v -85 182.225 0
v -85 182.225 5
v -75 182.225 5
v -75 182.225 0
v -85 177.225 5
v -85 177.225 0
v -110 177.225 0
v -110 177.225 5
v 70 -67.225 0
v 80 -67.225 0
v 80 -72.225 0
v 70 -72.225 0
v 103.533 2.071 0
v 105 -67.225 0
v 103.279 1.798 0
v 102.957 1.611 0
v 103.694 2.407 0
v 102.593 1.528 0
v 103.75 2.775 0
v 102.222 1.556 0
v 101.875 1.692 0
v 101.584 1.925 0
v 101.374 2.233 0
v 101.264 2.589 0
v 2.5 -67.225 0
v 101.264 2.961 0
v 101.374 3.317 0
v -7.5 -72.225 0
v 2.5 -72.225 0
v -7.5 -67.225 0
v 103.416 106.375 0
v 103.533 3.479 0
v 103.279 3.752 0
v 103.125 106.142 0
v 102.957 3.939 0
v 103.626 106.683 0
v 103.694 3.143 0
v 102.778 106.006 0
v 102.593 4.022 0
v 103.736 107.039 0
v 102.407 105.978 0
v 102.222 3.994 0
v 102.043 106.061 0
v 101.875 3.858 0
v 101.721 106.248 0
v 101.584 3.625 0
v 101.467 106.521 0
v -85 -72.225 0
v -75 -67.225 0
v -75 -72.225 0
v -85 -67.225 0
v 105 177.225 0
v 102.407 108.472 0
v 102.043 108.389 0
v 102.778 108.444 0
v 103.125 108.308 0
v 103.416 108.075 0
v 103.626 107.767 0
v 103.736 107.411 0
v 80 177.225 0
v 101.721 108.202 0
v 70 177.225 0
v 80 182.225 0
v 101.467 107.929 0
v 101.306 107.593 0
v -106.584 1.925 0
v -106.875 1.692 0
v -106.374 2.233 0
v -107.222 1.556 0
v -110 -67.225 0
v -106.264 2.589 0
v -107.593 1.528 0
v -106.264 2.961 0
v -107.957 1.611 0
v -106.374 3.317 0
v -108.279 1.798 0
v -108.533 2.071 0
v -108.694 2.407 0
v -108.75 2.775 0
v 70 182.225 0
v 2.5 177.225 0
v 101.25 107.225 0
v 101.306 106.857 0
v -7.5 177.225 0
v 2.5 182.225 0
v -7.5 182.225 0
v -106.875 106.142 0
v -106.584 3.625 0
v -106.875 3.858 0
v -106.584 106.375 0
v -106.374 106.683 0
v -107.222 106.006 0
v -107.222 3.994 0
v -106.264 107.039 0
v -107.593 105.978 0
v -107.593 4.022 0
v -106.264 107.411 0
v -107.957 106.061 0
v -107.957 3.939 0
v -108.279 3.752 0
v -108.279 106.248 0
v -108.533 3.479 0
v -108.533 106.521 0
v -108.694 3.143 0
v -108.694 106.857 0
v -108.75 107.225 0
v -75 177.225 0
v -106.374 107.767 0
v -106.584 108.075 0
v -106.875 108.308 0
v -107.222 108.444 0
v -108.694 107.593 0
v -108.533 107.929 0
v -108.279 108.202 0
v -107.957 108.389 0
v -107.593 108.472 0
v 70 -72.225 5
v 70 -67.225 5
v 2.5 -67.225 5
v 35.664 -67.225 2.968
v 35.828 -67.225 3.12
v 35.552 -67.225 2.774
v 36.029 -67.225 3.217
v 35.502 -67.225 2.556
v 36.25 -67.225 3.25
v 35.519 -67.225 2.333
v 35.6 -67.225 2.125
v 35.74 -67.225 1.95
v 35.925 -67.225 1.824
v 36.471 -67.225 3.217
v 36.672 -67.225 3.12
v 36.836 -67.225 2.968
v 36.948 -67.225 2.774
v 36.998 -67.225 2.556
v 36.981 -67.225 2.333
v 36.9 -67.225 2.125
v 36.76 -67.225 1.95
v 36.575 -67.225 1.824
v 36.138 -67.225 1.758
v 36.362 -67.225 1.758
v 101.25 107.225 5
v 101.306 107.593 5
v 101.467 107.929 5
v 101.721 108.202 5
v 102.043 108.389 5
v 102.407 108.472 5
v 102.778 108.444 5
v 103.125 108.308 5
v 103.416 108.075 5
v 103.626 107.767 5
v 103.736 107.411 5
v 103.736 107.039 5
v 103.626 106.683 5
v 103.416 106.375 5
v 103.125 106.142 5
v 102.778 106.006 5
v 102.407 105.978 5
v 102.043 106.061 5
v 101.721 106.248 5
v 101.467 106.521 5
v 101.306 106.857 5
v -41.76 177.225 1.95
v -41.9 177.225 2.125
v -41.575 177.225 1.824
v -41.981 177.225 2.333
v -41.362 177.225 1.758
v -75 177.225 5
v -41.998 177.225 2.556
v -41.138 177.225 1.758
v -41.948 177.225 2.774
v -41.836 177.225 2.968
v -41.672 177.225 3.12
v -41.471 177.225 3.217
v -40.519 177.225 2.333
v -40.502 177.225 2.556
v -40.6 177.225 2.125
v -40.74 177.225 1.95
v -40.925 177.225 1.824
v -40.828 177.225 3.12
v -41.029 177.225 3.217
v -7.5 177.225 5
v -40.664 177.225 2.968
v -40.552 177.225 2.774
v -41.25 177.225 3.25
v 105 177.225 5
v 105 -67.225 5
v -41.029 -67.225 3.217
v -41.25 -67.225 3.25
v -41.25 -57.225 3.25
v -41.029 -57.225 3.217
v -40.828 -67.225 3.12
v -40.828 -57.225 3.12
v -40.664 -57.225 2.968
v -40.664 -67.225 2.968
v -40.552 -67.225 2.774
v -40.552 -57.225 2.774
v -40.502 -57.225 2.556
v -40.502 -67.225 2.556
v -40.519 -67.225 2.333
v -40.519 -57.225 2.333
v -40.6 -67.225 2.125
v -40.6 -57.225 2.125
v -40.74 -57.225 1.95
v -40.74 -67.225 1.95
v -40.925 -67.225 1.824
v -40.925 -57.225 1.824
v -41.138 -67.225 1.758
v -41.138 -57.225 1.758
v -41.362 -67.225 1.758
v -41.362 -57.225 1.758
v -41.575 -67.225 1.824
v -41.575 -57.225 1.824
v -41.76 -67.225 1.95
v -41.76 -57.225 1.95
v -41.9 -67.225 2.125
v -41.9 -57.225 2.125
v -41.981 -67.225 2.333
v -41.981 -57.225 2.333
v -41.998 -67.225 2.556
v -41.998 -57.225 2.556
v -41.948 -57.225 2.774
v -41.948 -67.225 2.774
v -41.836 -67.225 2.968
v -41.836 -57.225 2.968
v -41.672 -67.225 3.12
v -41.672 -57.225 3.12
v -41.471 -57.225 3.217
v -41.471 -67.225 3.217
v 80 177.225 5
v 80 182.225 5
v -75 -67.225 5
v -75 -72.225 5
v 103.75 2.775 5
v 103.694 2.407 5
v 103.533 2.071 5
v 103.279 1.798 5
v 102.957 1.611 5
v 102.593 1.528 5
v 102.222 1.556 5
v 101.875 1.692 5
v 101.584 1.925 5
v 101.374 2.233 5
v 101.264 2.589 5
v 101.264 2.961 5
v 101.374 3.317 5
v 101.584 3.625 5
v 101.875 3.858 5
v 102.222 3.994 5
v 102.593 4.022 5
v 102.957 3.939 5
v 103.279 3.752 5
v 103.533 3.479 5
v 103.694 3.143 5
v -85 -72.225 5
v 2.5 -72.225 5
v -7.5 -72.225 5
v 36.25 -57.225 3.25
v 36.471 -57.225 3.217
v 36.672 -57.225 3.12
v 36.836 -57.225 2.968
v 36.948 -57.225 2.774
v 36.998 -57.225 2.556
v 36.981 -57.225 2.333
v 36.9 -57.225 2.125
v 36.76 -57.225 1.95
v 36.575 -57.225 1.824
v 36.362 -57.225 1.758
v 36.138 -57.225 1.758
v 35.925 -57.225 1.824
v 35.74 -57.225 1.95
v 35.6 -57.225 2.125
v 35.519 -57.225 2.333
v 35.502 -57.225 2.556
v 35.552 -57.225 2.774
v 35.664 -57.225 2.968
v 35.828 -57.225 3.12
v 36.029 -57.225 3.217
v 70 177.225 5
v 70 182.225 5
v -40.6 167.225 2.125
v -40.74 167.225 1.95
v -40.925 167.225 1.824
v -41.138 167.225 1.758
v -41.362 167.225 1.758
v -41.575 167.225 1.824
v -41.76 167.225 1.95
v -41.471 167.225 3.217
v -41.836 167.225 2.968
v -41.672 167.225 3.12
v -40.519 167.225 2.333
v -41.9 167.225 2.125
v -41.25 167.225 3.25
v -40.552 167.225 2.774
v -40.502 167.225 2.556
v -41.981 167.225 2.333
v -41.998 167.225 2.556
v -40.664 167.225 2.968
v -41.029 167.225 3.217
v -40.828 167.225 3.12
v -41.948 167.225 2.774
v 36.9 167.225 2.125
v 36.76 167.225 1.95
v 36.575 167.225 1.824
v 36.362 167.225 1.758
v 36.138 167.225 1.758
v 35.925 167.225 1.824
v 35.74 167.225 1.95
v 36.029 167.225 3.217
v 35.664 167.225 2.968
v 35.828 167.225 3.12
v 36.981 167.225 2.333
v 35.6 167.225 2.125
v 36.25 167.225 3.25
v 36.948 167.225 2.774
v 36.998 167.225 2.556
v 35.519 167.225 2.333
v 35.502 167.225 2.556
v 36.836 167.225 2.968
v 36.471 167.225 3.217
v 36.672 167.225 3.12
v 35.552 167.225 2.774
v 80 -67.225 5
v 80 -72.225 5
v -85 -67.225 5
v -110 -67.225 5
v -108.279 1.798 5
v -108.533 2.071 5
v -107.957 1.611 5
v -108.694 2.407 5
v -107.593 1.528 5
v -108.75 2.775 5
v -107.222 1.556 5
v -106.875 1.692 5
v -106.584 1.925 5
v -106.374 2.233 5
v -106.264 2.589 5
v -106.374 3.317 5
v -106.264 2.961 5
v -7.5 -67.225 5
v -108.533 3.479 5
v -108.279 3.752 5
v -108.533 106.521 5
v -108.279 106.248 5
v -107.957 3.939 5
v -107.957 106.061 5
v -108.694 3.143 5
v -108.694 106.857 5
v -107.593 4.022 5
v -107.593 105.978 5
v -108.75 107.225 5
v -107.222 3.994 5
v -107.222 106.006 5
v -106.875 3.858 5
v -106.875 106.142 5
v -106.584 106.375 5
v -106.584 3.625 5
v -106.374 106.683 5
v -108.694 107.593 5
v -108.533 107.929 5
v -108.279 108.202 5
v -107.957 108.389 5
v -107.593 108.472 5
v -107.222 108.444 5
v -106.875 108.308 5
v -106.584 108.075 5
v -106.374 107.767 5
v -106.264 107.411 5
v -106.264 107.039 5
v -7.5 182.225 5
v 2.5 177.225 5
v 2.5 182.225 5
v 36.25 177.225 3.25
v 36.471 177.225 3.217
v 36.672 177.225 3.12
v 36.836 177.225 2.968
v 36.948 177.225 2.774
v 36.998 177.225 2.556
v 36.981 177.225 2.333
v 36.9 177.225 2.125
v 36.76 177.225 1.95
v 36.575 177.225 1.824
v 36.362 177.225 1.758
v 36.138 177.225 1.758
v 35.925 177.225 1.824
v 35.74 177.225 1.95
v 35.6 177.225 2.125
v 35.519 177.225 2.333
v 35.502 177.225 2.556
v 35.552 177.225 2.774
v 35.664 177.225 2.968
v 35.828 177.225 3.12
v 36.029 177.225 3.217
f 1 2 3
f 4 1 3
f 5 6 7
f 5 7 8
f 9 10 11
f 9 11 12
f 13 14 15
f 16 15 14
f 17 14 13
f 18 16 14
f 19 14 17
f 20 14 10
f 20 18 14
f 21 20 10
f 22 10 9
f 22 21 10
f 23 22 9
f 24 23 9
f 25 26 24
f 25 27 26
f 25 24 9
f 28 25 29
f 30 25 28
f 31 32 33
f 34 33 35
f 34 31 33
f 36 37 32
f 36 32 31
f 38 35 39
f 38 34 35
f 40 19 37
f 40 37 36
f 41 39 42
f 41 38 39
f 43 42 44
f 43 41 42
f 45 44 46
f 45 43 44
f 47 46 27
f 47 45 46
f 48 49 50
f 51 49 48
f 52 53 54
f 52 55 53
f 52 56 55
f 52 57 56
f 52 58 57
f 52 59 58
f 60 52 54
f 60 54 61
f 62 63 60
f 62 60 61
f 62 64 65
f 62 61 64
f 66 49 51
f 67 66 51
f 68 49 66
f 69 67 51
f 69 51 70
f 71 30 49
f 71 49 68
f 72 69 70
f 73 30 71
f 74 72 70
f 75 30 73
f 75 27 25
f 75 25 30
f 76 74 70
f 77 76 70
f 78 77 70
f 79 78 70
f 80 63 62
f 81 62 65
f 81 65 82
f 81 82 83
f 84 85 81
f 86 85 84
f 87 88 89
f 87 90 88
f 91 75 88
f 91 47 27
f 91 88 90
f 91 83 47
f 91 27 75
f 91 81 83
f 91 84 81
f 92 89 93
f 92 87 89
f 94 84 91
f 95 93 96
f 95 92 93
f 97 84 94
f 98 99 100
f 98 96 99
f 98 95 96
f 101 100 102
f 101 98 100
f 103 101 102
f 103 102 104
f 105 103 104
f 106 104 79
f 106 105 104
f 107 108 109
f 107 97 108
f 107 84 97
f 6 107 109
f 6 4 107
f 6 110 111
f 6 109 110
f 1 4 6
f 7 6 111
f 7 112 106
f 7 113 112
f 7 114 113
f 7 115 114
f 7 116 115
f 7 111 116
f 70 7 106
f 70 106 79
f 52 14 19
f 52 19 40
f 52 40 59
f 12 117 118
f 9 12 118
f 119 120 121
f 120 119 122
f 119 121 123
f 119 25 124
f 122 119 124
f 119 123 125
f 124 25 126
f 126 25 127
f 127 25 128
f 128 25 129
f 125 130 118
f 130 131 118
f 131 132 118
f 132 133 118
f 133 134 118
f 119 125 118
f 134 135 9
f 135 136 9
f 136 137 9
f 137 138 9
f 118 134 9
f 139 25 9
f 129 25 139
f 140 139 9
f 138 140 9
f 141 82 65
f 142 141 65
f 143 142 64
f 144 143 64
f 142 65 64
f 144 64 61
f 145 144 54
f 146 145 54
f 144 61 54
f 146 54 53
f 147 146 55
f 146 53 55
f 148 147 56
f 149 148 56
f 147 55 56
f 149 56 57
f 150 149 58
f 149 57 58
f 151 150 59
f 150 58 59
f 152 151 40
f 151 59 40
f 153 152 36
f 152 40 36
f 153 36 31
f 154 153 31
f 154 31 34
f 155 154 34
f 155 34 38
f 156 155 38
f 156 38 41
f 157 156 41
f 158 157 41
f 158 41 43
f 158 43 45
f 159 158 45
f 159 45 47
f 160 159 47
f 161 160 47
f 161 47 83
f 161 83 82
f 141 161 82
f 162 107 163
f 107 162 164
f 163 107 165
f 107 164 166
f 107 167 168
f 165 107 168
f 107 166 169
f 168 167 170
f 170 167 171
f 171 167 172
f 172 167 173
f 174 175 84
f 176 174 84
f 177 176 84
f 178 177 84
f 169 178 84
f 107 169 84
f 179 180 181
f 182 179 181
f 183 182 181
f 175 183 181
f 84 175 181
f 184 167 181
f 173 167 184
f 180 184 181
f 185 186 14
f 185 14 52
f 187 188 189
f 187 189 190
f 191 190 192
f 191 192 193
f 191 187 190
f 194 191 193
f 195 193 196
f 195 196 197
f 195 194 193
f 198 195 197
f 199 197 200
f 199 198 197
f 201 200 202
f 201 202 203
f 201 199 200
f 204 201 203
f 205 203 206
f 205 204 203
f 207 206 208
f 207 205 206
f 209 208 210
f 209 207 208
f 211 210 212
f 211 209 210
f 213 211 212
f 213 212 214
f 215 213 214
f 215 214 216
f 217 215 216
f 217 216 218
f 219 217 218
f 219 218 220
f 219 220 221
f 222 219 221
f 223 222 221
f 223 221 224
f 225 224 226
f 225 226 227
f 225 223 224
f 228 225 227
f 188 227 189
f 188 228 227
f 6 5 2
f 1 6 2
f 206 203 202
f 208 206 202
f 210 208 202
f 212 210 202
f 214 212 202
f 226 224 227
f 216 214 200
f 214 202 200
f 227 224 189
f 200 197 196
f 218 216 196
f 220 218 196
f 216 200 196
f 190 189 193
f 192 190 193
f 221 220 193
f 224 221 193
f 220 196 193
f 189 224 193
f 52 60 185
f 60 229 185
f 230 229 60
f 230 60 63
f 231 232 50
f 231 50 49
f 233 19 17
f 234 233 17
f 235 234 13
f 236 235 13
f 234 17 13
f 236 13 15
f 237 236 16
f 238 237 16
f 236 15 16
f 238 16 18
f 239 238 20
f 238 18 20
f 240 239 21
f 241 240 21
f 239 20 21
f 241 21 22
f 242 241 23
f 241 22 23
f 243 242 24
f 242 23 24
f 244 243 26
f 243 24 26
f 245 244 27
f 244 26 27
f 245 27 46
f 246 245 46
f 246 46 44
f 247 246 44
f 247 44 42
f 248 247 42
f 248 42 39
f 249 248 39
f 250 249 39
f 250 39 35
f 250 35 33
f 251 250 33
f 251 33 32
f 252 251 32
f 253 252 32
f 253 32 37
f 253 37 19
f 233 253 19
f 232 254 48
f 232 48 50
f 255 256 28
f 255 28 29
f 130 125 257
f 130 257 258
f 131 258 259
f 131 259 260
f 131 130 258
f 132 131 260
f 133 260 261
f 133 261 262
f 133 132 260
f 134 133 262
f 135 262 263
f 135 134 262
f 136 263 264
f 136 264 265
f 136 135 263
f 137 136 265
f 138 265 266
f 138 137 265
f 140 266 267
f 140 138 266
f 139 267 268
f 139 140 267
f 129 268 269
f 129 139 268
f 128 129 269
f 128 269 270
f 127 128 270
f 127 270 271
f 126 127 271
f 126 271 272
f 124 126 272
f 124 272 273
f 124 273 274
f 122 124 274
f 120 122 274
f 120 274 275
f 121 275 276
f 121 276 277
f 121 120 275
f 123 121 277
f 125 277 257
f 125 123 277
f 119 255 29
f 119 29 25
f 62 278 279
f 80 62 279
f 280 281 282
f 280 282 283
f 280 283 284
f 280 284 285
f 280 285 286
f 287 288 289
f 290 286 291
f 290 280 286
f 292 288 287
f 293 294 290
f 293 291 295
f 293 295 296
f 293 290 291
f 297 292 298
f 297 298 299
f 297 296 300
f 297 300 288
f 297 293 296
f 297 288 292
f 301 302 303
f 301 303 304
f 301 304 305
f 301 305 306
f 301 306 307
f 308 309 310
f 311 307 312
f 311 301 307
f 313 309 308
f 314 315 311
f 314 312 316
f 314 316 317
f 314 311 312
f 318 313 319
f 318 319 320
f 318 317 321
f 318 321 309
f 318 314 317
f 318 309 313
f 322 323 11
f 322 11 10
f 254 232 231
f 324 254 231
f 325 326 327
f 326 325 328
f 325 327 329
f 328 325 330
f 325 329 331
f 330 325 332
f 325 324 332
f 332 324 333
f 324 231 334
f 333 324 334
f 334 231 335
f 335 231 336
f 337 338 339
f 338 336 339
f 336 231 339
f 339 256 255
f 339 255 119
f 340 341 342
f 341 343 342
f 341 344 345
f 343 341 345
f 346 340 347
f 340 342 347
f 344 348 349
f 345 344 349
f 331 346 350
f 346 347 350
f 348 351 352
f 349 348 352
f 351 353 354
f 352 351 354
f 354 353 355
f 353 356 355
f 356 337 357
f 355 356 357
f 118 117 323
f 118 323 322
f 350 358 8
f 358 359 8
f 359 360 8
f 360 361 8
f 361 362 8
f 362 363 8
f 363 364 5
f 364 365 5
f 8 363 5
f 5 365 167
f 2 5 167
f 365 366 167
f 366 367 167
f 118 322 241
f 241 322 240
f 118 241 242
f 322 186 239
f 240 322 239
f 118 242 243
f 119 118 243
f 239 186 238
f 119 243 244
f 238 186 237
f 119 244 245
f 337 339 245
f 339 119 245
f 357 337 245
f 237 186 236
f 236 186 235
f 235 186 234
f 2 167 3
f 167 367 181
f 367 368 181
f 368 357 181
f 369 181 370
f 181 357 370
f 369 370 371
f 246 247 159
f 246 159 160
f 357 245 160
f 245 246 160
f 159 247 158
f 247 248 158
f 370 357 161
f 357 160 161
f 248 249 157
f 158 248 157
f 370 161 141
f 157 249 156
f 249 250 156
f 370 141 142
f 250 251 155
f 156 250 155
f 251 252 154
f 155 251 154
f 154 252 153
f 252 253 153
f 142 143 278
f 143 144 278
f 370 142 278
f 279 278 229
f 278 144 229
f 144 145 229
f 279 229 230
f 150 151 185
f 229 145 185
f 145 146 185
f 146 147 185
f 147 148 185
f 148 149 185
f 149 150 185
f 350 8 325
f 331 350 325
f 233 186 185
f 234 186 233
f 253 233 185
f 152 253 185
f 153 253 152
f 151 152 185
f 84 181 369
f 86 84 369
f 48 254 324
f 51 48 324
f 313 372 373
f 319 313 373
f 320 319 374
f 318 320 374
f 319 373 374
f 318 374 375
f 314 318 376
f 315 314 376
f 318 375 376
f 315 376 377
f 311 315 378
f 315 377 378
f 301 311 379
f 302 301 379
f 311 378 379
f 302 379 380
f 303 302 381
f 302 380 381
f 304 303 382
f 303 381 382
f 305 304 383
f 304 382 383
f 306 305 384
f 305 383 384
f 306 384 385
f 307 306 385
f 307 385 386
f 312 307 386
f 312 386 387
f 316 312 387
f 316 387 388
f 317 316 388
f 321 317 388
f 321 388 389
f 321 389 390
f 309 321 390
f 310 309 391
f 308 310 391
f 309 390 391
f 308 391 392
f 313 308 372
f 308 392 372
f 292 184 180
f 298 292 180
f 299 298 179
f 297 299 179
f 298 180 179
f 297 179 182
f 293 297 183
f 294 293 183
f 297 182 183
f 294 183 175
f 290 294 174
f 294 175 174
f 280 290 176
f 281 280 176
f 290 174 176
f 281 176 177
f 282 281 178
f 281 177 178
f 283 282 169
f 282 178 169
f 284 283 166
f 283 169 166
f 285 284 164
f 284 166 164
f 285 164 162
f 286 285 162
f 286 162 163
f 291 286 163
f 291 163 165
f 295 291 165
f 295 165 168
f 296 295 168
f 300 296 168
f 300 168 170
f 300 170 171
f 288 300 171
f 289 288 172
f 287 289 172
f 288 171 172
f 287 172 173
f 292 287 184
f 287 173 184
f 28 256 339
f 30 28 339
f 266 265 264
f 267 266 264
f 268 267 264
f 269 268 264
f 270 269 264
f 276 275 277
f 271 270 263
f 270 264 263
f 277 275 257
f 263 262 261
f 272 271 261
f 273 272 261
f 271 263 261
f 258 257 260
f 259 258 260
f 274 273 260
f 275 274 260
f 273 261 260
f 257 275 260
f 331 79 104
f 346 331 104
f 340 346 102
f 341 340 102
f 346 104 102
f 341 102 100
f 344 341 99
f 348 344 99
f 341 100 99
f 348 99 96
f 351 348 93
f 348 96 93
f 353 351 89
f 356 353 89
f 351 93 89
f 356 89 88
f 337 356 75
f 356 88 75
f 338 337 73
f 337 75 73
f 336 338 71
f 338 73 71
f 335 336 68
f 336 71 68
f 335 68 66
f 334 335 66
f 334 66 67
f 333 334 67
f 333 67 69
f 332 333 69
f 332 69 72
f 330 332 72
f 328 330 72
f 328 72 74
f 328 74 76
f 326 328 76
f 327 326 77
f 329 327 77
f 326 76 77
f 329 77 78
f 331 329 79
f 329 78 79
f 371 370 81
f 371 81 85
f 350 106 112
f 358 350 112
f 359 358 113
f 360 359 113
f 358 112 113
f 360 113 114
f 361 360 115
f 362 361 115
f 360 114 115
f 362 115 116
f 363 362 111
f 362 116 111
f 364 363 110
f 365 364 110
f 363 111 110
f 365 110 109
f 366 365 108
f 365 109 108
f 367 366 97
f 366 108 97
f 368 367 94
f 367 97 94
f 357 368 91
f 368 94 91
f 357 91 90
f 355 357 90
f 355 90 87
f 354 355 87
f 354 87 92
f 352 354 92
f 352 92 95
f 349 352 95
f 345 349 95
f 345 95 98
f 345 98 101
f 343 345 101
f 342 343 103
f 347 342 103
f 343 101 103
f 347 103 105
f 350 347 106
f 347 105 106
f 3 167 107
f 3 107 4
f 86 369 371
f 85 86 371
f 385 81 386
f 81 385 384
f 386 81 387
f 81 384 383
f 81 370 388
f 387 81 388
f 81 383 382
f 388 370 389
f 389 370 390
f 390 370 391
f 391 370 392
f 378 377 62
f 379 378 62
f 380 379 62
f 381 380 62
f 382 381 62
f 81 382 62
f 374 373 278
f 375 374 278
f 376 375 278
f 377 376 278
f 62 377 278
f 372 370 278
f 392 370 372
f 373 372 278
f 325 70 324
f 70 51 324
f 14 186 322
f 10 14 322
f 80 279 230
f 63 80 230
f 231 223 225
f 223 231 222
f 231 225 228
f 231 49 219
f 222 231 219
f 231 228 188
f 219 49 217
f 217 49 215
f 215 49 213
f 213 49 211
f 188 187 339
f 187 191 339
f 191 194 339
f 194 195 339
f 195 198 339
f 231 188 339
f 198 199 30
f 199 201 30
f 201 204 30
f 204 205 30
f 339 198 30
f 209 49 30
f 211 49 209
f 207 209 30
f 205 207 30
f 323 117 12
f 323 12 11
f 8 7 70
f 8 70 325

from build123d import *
from build123d.topology import SkipClean

# Parameters (mm, degrees)
SKIZZE1_W                       = 5
SKIZZE1_H                       = 5
SKIZZE1_W_2                     = 15
AUFSATZ_LINEAR_AUSTRAGEN1_DEPTH = 5
SKIZZE2_R                       = 2.75
SCHNITT_LINEAR_AUSTRAGEN1_DEPTH = 128.539996178
SCHNITT_LINEAR_AUSTRAGEN2_DEPTH = 128.539996178
SKIZZE4_R                       = 7.5
SCHNITT_LINEAR_AUSTRAGEN3_DEPTH = 128.539996178
SKIZZE5_R                       = 0.75
SKIZZE5_R_2                     = 6
SENSORS_DEPTH                   = 128.539996178
AUFSATZ_LINEAR_AUSTRAGEN2_DEPTH = 5
SKIZZE7_R                       = 1.25
SCHNITT_LINEAR_AUSTRAGEN5_DEPTH = 239.81729549
SKETCH1_W                       = 69.5
SKETCH1_H                       = 110
BOSS_EXTRUDE1_DEPTH             = 5
SKIZZE9_R                       = 0.75
SKIZZE9_R_2                     = 6
DISCRETECHANNEL_DEPTH           = 239.81729549
SKIZZE10_R                      = 0.75
SKIZZE10_R_2                    = 6
CONTCHANNEL_DEPTH               = 239.81729549
BOSS_EXTRUDE2_DEPTH             = 5
SKIZZE8_R                       = 0.75
SKIZZE8_R_2                     = 7.5
STEPDOWNCONVERTER_DEPTH         = 239.81729549
SKETCH3_R                       = 0.75
SKETCH3_R_2                     = 5
BBB_DEPTH                       = 5
BOSS_EXTRUDE3_DEPTH             = 5
SKETCH5_W                       = 55
SKETCH5_H                       = 244.45
CUT_EXTRUDE2_DEPTH              = 5
SKETCH6_R                       = 5
CUT_EXTRUDE3_DEPTH              = 5
SKETCH7_W                       = 5
SKETCH7_H                       = 10
BOSS_EXTRUDE4_DEPTH             = 5
SKETCH8_W                       = 10
SKETCH8_H                       = 5
BOSS_EXTRUDE5_DEPTH             = 5
BOSS_EXTRUDE6_START             = -5
SKETCH9_W                       = 210
SKETCH9_H                       = 244.45
SKETCH9_R                       = 2.75
SKETCH9_R_2                     = 7.5
BOSS_EXTRUDE6_DEPTH             = 5
SKETCH10_R                      = 1.25
CUT_EXTRUDE4_DEPTH              = 5
SKETCH11_R                      = 1.25
CUT_EXTRUDE5_DEPTH              = 211.370983325
SKETCH12_R                      = 0.75
CUT_EXTRUDE6_DEPTH              = 10
SKETCH13_W                      = 66.883325803
SKETCH13_H                      = 19.006877893
SKETCH13_W_2                    = 28.314677108
SKETCH13_H_2                    = 100.605818773
SKETCH13_W_3                    = 44.298538928
SKETCH13_H_3                    = 29.20603568
BOSS_EXTRUDE7_DEPTH             = 5
SKETCH14_W                      = 5
SKETCH14_H                      = 244.45
BOSS_EXTRUDE8_DEPTH             = 5
SKETCH15_R                      = 1.25
CUT_EXTRUDE7_DEPTH              = 5
SKETCH16_R                      = 1.25
BOSS_EXTRUDE9_DEPTH             = 5


with BuildPart() as part:
    # Skizze1 → Aufsatz-Linear austragen1 (new body)
    with BuildSketch(Plane.XY):
        Polygon((55, 67.225), (75, 67.225), (75, 72.225), (85, 72.225), (85, 67.225), (100, 67.225), (100, 47.225), (105, 47.225), (105, 37.225), (100, 37.225), (100, -37.225), (105, -37.225), (105, -47.225), (100, -47.225), (100, -67.225), (-100, -67.225), (-100, -47.225), (-105, -47.225), (-105, -37.225), (-100, -37.225), (-100, 37.225), (-105, 37.225), (-105, 47.225), (-100, 47.225), (-100, 67.225), (-85, 67.225), (-85, 72.225), (-75, 72.225), (-75, 67.225), (45, 67.225), (45, 72.225), (55, 72.225), align=None)
        with Locations((13, -40.055)):
            Rectangle(SKIZZE1_W, SKIZZE1_H, mode=Mode.SUBTRACT)
        with Locations((53, -40.055)):
            Rectangle(SKIZZE1_W, SKIZZE1_H, mode=Mode.SUBTRACT)
        with Locations((33, -40.055)):
            Rectangle(SKIZZE1_W_2, SKIZZE1_H, mode=Mode.SUBTRACT)
    extrude(amount=AUFSATZ_LINEAR_AUSTRAGEN1_DEPTH)

    # Skizze2 → Schnitt-Linear austragen1 (cut, through all)
    with BuildSketch(Plane.XY.offset(5)):
        with Locations((-59.5, 4.075)):
            Circle(SKIZZE2_R)
        with Locations((-24.5, -11.925)):
            Circle(SKIZZE2_R)
    extrude(amount=-SCHNITT_LINEAR_AUSTRAGEN1_DEPTH, mode=Mode.SUBTRACT)

    # Skizze3 → Schnitt-Linear austragen2 (cut, through all)
    with BuildSketch(Plane.XY.offset(5)):
        with BuildLine():
            Line((25, -17.555), (41, -17.555))
            ThreePointArc((41, -17.555), (42.414213562, -18.140786438), (43, -19.555))
            Line((43, -19.555), (43, -35.555))
            ThreePointArc((43, -35.555), (42.414213562, -36.969213562), (41, -37.555))
            Line((41, -37.555), (37, -37.555))
            Line((37, -37.555), (29, -37.555))
            Line((29, -37.555), (25, -37.555))
            ThreePointArc((25, -37.555), (23.585786438, -36.969213562), (23, -35.555))
            Line((23, -35.555), (23, -19.555))
            ThreePointArc((23, -19.555), (23.585786438, -18.140786438), (25, -17.555))
        make_face()
        with BuildLine():
            Line((-66.5, 54.225), (-66.5, 35.225))
            ThreePointArc((-66.5, 35.225), (-67.378679656, 33.103679656), (-69.5, 32.225))
            Line((-69.5, 32.225), (-88.5, 32.225))
            ThreePointArc((-88.5, 32.225), (-90.621320344, 33.103679656), (-91.5, 35.225))
            Line((-91.5, 35.225), (-91.5, 54.225))
            ThreePointArc((-91.5, 54.225), (-90.621320344, 56.346320344), (-88.5, 57.225))
            Line((-88.5, 57.225), (-69.5, 57.225))
            ThreePointArc((-69.5, 57.225), (-67.378679656, 56.346320344), (-66.5, 54.225))
        make_face()
        with BuildLine():
            Line((4.5, 57.225), (-14.5, 57.225))
            ThreePointArc((-14.5, 57.225), (-16.621320344, 56.346320344), (-17.5, 54.225))
            Line((-17.5, 54.225), (-17.5, 35.225))
            ThreePointArc((-17.5, 35.225), (-16.621320344, 33.103679656), (-14.5, 32.225))
            Line((-14.5, 32.225), (4.5, 32.225))
            ThreePointArc((4.5, 32.225), (6.621320344, 33.103679656), (7.5, 35.225))
            Line((7.5, 35.225), (7.5, 54.225))
            ThreePointArc((7.5, 54.225), (6.621320344, 56.346320344), (4.5, 57.225))
        make_face()
    extrude(amount=-SCHNITT_LINEAR_AUSTRAGEN2_DEPTH, mode=Mode.SUBTRACT)

    # Skizze4 → Schnitt-Linear austragen3 (cut, through all)
    with BuildSketch(Plane.XY.offset(5)):
        with Locations((-80.5, -30.925)):
            Circle(SKIZZE4_R)
        with Locations((-80.5, -11.925)):
            Circle(SKIZZE4_R)
        with Locations(Location((-80.5, -49.925, 0), (0, 0, 180))):
            Circle(SKIZZE4_R)
    extrude(amount=-SCHNITT_LINEAR_AUSTRAGEN3_DEPTH, mode=Mode.SUBTRACT)

    # Skizze5 → Sensors (cut, through all)
    with BuildSketch(Plane.XY.offset(5)):
        with Locations((-8, -45.225)):
            Circle(SKIZZE5_R)
        with Locations((-8, -3.225)):
            Circle(SKIZZE5_R)
        with Locations((83, -12.225)):
            Circle(SKIZZE5_R)
        with Locations((-15, -56.225)):
            Circle(SKIZZE5_R_2)
        with Locations((0, -56.225)):
            Circle(SKIZZE5_R_2)
        with Locations((15, -56.225)):
            Circle(SKIZZE5_R_2)
        with Locations((30, -56.225)):
            Circle(SKIZZE5_R_2)
        with Locations((45, -56.225)):
            Circle(SKIZZE5_R_2)
        with Locations((60, -56.225)):
            Circle(SKIZZE5_R_2)
        with Locations((75, -56.225)):
            Circle(SKIZZE5_R_2)
        with Locations((90, -56.225)):
            Circle(SKIZZE5_R_2)
    extrude(amount=-SENSORS_DEPTH, mode=Mode.SUBTRACT)

    # Skizze6 → Aufsatz-Linear austragen2 (add)
    with BuildSketch(Plane(origin=(0, 0, 0), x_dir=(-1, 0, 0), z_dir=(0, 0, -1))):
        Polygon((160, 47.225), (160, 37.225), (160, -37.225), (160, -47.225), (160, -67.225), (100, -67.225), (100, 67.225), (-30.5, 67.225), (-30.5, 177.225), (160, 177.225), (160, 67.225), align=None)
    extrude(amount=-AUFSATZ_LINEAR_AUSTRAGEN2_DEPTH)

    # Skizze7 → Schnitt-Linear austragen5 (cut, through all)
    with BuildSketch(Plane(origin=(0, 0, 0), x_dir=(-1, 0, 0), z_dir=(0, 0, -1))):
        with Locations((71.5, 32.775)):
            Circle(SKIZZE7_R)
        with Locations((96.5, 32.775)):
            Circle(SKIZZE7_R)
        with Locations((46.5, 32.775)):
            Circle(SKIZZE7_R)
    extrude(amount=-SCHNITT_LINEAR_AUSTRAGEN5_DEPTH, mode=Mode.SUBTRACT)

    # Sketch1 → Boss-Extrude1 (add)
    with BuildSketch(Plane.XY.offset(5)):
        with Locations((65.25, 122.225)):
            Rectangle(SKETCH1_W, SKETCH1_H)
    extrude(amount=-BOSS_EXTRUDE1_DEPTH)

    # Skizze9 → DiscreteChannel (cut, through all)
    with BuildSketch(Plane.XY.offset(5)):
        with Locations((8, 71.515)):
            Circle(SKIZZE9_R)
        with Locations(Location((69, 71.515, 0), (0, 0, 180))):
            Circle(SKIZZE9_R)
        with Locations(Location((8, 10.515, 0), (0, 0, 180))):
            Circle(SKIZZE9_R)
        with Locations((69, 10.515)):
            Circle(SKIZZE9_R)
        with Locations((-2, 5.015)):
            Circle(SKIZZE9_R_2)
        with Locations((-2, 29.015)):
            Circle(SKIZZE9_R_2)
        with Locations((-2, 53.015)):
            Circle(SKIZZE9_R_2)
        with Locations((-2, 77.015)):
            Circle(SKIZZE9_R_2)
    extrude(amount=-DISCRETECHANNEL_DEPTH, mode=Mode.SUBTRACT)

    # Skizze10 → ContChannel (cut, through all)
    with BuildSketch(Plane.XY.offset(5)):
        with Locations((-4, 136.225)):
            Circle(SKIZZE10_R)
        with Locations(Location((-4, 94.225, 0), (0, 0, 180))):
            Circle(SKIZZE10_R)
        with Locations(Location((-96, 136.225, 0), (0, 0, 180))):
            Circle(SKIZZE10_R)
        with Locations((-96, 94.225)):
            Circle(SKIZZE10_R)
        with Locations((-72.499999267, 166.225)):
            Circle(SKIZZE10_R_2)
        with Locations((-57.499999267, 166.225)):
            Circle(SKIZZE10_R_2)
        with Locations((-42.499999267, 166.225)):
            Circle(SKIZZE10_R_2)
        with Locations((-27.499999267, 166.225)):
            Circle(SKIZZE10_R_2)
        with Locations((-27.499999267, 151.225)):
            Circle(SKIZZE10_R_2)
        with Locations((-42.499999267, 151.225)):
            Circle(SKIZZE10_R_2)
        with Locations((-57.499999267, 151.225)):
            Circle(SKIZZE10_R_2)
        with Locations((-72.499999267, 151.225)):
            Circle(SKIZZE10_R_2)
    extrude(amount=-CONTCHANNEL_DEPTH, mode=Mode.SUBTRACT)

    # Sketch2 → Boss-Extrude2 (add)
    with SkipClean():  # the faces are left unmerged after this step: merging them gives an invalid solid
        with BuildSketch(Plane.XY.offset(5)):
            with BuildLine():
                Line((-14.5, 32.225), (-7.069112348, 32.225))
                ThreePointArc((-7.069112348, 32.225), (-2, 35.015), (3.069112348, 32.225))
                Line((3.069112348, 32.225), (4.5, 32.225))
                ThreePointArc((4.5, 32.225), (6.621320344, 33.103679656), (7.5, 35.225))
                Line((7.5, 35.225), (7.5, 54.225))
                ThreePointArc((7.5, 54.225), (6.621320344, 56.346320344), (4.5, 57.225))
                Line((4.5, 57.225), (2.275032164, 57.225))
                ThreePointArc((2.275032164, 57.225), (-2, 47.015), (-6.275032164, 57.225))
                Line((-6.275032164, 57.225), (-14.5, 57.225))
                ThreePointArc((-14.5, 57.225), (-16.621320344, 56.346320344), (-17.5, 54.225))
                Line((-17.5, 54.225), (-17.5, 35.225))
                ThreePointArc((-17.5, 35.225), (-16.621320344, 33.103679656), (-14.5, 32.225))
            make_face()
        extrude(amount=-BOSS_EXTRUDE2_DEPTH)

    # Skizze8 → StepDownConverter (cut, through all)
    with SkipClean():  # the faces are left unmerged after this step: merging them gives an invalid solid
        with BuildSketch(Plane.XY.offset(5)):
            with Locations((62.5, 153.225)):
                Circle(SKIZZE8_R)
            with Locations(Location((93.5, 153.225, 0), (0, 0, 180))):
                Circle(SKIZZE8_R)
            with Locations(Location((62.5, 100.225, 0), (0, 0, 180))):
                Circle(SKIZZE8_R)
            with Locations((93.5, 100.225)):
                Circle(SKIZZE8_R)
            with Locations((78, 86.225)):
                Circle(SKIZZE8_R_2)
            with Locations(Location((78, 167.225, 0), (0, 0, 180))):
                Circle(SKIZZE8_R_2)
        extrude(amount=-STEPDOWNCONVERTER_DEPTH, mode=Mode.SUBTRACT)

    # Sketch3 → BBB (cut)
    with SkipClean():  # the faces are left unmerged after this step: merging them gives an invalid solid
        with BuildSketch(Plane.XY.offset(5)):
            with Locations((21.85, 147.68)):
                Circle(SKETCH3_R)
            with Locations((87.89, 102.59)):
                Circle(SKETCH3_R)
            with Locations(Location((87.89, 150.86, 0), (0, 0, 180))):
                Circle(SKETCH3_R)
            with Locations(Location((21.85, 105.77, 0), (0, 0, 180))):
                Circle(SKETCH3_R)
            with Locations((13, 167.225)):
                Circle(SKETCH3_R_2)
            with Locations((28, 167.225)):
                Circle(SKETCH3_R_2)
            with Locations((43, 167.225)):
                Circle(SKETCH3_R_2)
            with Locations((58, 167.225)):
                Circle(SKETCH3_R_2)
            with Locations(Location((13, 86.225, 0), (0, 0, 180))):
                Circle(SKETCH3_R_2)
        extrude(amount=-BBB_DEPTH, mode=Mode.SUBTRACT)

    # Sketch4 → Boss-Extrude3 (add)
    with SkipClean():  # the faces are left unmerged after this step: merging them gives an invalid solid
        with BuildSketch(Plane.XY.offset(5)):
            with BuildLine():
                Line((-88.5, 32.225), (-72.622497216, 32.225))
                ThreePointArc((-72.622497216, 32.225), (-71.5, 34.025), (-70.377502784, 32.225))
                Line((-70.377502784, 32.225), (-69.5, 32.225))
                ThreePointArc((-69.5, 32.225), (-67.378679656, 33.103679656), (-66.5, 35.225))
                Line((-66.5, 35.225), (-66.5, 54.225))
                ThreePointArc((-66.5, 54.225), (-67.378679656, 56.346320344), (-69.5, 57.225))
                Line((-69.5, 57.225), (-88.5, 57.225))
                ThreePointArc((-88.5, 57.225), (-90.621320344, 56.346320344), (-91.5, 54.225))
                Line((-91.5, 54.225), (-91.5, 35.225))
                ThreePointArc((-91.5, 35.225), (-90.621320344, 33.103679656), (-88.5, 32.225))
            make_face()
        extrude(amount=-BOSS_EXTRUDE3_DEPTH)

    # Sketch5 → Cut-Extrude2 (cut)
    with SkipClean():  # the faces are left unmerged after this step: merging them gives an invalid solid
        with BuildSketch(Plane.XY.offset(5)):
            with Locations((-132.5, 55)):
                Rectangle(SKETCH5_W, SKETCH5_H)
        extrude(amount=-CUT_EXTRUDE2_DEPTH, mode=Mode.SUBTRACT)

    # Sketch6 → Cut-Extrude3 (cut)
    with SkipClean():  # the faces are left unmerged after this step: merging them gives an invalid solid
        with BuildSketch(Plane.XY.offset(5)):
            with Locations((-95, 82.775)):
                Circle(SKETCH6_R)
            with Locations((-80, 82.775)):
                Circle(SKETCH6_R)
            with Locations((-95, -32.225)):
                Circle(SKETCH6_R)
            with Locations((-65, 82.775)):
                Circle(SKETCH6_R)
        extrude(amount=-CUT_EXTRUDE3_DEPTH, mode=Mode.SUBTRACT)

    # Sketch7 → Boss-Extrude4 (add)
    with SkipClean():  # the faces are left unmerged after this step: merging them gives an invalid solid
        with BuildSketch(Plane.XY.offset(5)):
            with Locations((102.5, 152.225)):
                Rectangle(SKETCH7_W, SKETCH7_H)
        extrude(amount=-BOSS_EXTRUDE4_DEPTH)

    # Sketch8 → Boss-Extrude5 (add)
    with SkipClean():  # the faces are left unmerged after this step: merging them gives an invalid solid
        with BuildSketch(Plane.XY.offset(5)):
            with Locations((-80, -69.725)):
                Rectangle(SKETCH8_W, SKETCH8_H)
            with Locations((-2.5, -69.725)):
                Rectangle(SKETCH8_W, SKETCH8_H)
            with Locations((75, -69.725)):
                Rectangle(SKETCH8_W, SKETCH8_H)
            with Locations((75, 179.725)):
                Rectangle(SKETCH8_W, SKETCH8_H)
            with Locations((-2.5, 179.725)):
                Rectangle(SKETCH8_W, SKETCH8_H)
            with Locations((-80, 179.725)):
                Rectangle(SKETCH8_W, SKETCH8_H)
        extrude(amount=-BOSS_EXTRUDE5_DEPTH)

    # Sketch9 → Boss-Extrude6 (add)
    with BuildSketch(Plane(origin=(0, 0, 0), x_dir=(-1, 0, 0), z_dir=(0, 0, -1)).offset(BOSS_EXTRUDE6_START)):
        with Locations((0, 55)):
            Rectangle(SKETCH9_W, SKETCH9_H)
        with Locations(Location((59.5, 4.075, 0), (0, 0, 180))):
            Circle(SKETCH9_R, mode=Mode.SUBTRACT)
        with Locations(Location((24.5, -11.925, 0), (0, 0, 180))):
            Circle(SKETCH9_R, mode=Mode.SUBTRACT)
        with Locations((80.5, -49.925)):
            Circle(SKETCH9_R_2, mode=Mode.SUBTRACT)
        with Locations(Location((80.5, -30.925, 0), (0, 0, 180))):
            Circle(SKETCH9_R_2, mode=Mode.SUBTRACT)
        with Locations(Location((80.5, -11.925, 0), (0, 0, 180))):
            Circle(SKETCH9_R_2, mode=Mode.SUBTRACT)
    extrude(amount=BOSS_EXTRUDE6_DEPTH)

    # Sketch10 → Cut-Extrude4 (cut)
    with BuildSketch(Plane(origin=(0, 0, 0), x_dir=(-1, 0, 0), z_dir=(0, 0, -1))):
        with Locations((-45, 82.225)):
            Circle(SKETCH10_R)
        with Locations((-20, 82.225)):
            Circle(SKETCH10_R)
        with Locations((5, 82.225)):
            Circle(SKETCH10_R)
    extrude(amount=-CUT_EXTRUDE4_DEPTH, mode=Mode.SUBTRACT)

    # Sketch11 → Cut-Extrude5 (cut, through all)
    with BuildSketch(Plane(origin=(0, 0, 0), x_dir=(-1, 0, 0), z_dir=(0, 0, -1))):
        with Locations((-102.5, 107.225)):
            Circle(SKETCH11_R)
        with Locations(Location((-102.5, 2.775, 0), (0, 0, 180))):
            Circle(SKETCH11_R)
        with Locations((102.5, 2.775)):
            Circle(SKETCH11_R)
        with Locations(Location((102.5, 107.225, 0), (0, 0, 180))):
            Circle(SKETCH11_R)
    extrude(amount=-CUT_EXTRUDE5_DEPTH, mode=Mode.SUBTRACT)

    # Sketch12 → Cut-Extrude6 (cut)
    with BuildSketch(Plane(origin=(0, 177.225, 0), x_dir=(1, 0, 0), z_dir=(0, 1, 0))):
        with Locations(Location((-41.25, -2.5, 0), (0, 0, 270))):
            Circle(SKETCH12_R)
        with Locations(Location((36.25, -2.5, 0), (0, 0, 270))):
            Circle(SKETCH12_R)
    cut_extrude6 = extrude(amount=-CUT_EXTRUDE6_DEPTH, mode=Mode.SUBTRACT)

    # Mirror1: Cut-Extrude6 across plane
    add(cut_extrude6.mirror(Plane.ZX.offset(55)), mode=Mode.SUBTRACT)

    # Sketch13 → Boss-Extrude7 (add)
    with BuildSketch(Plane(origin=(0, 0, 0), x_dir=(-1, 0, 0), z_dir=(0, 0, -1))):
        with Locations((-18.62921432, 79.896589462)):
            Rectangle(SKETCH13_W, SKETCH13_H)
        with Locations((81.845523282, -14.081860775)):
            Rectangle(SKETCH13_W_2, SKETCH13_H_2)
        with Locations((40.616720798, -5.090395938)):
            Rectangle(SKETCH13_W_3, SKETCH13_H_3)
    extrude(amount=-BOSS_EXTRUDE7_DEPTH)

    # Sketch14 → Boss-Extrude8 (add)
    with BuildSketch(Plane.ZY.offset(105)):
        with Locations((2.5, 55)):
            Rectangle(SKETCH14_W, SKETCH14_H)
    extrude(amount=BOSS_EXTRUDE8_DEPTH)

    # Sketch15 → Cut-Extrude7 (cut)
    with BuildSketch(Plane(origin=(0, 0, 0), x_dir=(-1, 0, 0), z_dir=(0, 0, -1))):
        with Locations((102.5, 2.775)):
            Circle(SKETCH15_R)
        with Locations(Location((102.5, 107.225, 0), (0, 0, 180))):
            Circle(SKETCH15_R)
        with Locations((107.5, 2.775)):
            Circle(SKETCH15_R)
        with Locations((107.5, 107.225)):
            Circle(SKETCH15_R)
    extrude(amount=-CUT_EXTRUDE7_DEPTH, mode=Mode.SUBTRACT)

    # Sketch16 → Boss-Extrude9 (add)
    with BuildSketch(Plane(origin=(0, 0, 0), x_dir=(-1, 0, 0), z_dir=(0, 0, -1))):
        with Locations((102.5, 2.775)):
            Circle(SKETCH16_R)
        with Locations((102.5, 107.225)):
            Circle(SKETCH16_R)
    extrude(amount=-BOSS_EXTRUDE9_DEPTH)


solid = part.part
